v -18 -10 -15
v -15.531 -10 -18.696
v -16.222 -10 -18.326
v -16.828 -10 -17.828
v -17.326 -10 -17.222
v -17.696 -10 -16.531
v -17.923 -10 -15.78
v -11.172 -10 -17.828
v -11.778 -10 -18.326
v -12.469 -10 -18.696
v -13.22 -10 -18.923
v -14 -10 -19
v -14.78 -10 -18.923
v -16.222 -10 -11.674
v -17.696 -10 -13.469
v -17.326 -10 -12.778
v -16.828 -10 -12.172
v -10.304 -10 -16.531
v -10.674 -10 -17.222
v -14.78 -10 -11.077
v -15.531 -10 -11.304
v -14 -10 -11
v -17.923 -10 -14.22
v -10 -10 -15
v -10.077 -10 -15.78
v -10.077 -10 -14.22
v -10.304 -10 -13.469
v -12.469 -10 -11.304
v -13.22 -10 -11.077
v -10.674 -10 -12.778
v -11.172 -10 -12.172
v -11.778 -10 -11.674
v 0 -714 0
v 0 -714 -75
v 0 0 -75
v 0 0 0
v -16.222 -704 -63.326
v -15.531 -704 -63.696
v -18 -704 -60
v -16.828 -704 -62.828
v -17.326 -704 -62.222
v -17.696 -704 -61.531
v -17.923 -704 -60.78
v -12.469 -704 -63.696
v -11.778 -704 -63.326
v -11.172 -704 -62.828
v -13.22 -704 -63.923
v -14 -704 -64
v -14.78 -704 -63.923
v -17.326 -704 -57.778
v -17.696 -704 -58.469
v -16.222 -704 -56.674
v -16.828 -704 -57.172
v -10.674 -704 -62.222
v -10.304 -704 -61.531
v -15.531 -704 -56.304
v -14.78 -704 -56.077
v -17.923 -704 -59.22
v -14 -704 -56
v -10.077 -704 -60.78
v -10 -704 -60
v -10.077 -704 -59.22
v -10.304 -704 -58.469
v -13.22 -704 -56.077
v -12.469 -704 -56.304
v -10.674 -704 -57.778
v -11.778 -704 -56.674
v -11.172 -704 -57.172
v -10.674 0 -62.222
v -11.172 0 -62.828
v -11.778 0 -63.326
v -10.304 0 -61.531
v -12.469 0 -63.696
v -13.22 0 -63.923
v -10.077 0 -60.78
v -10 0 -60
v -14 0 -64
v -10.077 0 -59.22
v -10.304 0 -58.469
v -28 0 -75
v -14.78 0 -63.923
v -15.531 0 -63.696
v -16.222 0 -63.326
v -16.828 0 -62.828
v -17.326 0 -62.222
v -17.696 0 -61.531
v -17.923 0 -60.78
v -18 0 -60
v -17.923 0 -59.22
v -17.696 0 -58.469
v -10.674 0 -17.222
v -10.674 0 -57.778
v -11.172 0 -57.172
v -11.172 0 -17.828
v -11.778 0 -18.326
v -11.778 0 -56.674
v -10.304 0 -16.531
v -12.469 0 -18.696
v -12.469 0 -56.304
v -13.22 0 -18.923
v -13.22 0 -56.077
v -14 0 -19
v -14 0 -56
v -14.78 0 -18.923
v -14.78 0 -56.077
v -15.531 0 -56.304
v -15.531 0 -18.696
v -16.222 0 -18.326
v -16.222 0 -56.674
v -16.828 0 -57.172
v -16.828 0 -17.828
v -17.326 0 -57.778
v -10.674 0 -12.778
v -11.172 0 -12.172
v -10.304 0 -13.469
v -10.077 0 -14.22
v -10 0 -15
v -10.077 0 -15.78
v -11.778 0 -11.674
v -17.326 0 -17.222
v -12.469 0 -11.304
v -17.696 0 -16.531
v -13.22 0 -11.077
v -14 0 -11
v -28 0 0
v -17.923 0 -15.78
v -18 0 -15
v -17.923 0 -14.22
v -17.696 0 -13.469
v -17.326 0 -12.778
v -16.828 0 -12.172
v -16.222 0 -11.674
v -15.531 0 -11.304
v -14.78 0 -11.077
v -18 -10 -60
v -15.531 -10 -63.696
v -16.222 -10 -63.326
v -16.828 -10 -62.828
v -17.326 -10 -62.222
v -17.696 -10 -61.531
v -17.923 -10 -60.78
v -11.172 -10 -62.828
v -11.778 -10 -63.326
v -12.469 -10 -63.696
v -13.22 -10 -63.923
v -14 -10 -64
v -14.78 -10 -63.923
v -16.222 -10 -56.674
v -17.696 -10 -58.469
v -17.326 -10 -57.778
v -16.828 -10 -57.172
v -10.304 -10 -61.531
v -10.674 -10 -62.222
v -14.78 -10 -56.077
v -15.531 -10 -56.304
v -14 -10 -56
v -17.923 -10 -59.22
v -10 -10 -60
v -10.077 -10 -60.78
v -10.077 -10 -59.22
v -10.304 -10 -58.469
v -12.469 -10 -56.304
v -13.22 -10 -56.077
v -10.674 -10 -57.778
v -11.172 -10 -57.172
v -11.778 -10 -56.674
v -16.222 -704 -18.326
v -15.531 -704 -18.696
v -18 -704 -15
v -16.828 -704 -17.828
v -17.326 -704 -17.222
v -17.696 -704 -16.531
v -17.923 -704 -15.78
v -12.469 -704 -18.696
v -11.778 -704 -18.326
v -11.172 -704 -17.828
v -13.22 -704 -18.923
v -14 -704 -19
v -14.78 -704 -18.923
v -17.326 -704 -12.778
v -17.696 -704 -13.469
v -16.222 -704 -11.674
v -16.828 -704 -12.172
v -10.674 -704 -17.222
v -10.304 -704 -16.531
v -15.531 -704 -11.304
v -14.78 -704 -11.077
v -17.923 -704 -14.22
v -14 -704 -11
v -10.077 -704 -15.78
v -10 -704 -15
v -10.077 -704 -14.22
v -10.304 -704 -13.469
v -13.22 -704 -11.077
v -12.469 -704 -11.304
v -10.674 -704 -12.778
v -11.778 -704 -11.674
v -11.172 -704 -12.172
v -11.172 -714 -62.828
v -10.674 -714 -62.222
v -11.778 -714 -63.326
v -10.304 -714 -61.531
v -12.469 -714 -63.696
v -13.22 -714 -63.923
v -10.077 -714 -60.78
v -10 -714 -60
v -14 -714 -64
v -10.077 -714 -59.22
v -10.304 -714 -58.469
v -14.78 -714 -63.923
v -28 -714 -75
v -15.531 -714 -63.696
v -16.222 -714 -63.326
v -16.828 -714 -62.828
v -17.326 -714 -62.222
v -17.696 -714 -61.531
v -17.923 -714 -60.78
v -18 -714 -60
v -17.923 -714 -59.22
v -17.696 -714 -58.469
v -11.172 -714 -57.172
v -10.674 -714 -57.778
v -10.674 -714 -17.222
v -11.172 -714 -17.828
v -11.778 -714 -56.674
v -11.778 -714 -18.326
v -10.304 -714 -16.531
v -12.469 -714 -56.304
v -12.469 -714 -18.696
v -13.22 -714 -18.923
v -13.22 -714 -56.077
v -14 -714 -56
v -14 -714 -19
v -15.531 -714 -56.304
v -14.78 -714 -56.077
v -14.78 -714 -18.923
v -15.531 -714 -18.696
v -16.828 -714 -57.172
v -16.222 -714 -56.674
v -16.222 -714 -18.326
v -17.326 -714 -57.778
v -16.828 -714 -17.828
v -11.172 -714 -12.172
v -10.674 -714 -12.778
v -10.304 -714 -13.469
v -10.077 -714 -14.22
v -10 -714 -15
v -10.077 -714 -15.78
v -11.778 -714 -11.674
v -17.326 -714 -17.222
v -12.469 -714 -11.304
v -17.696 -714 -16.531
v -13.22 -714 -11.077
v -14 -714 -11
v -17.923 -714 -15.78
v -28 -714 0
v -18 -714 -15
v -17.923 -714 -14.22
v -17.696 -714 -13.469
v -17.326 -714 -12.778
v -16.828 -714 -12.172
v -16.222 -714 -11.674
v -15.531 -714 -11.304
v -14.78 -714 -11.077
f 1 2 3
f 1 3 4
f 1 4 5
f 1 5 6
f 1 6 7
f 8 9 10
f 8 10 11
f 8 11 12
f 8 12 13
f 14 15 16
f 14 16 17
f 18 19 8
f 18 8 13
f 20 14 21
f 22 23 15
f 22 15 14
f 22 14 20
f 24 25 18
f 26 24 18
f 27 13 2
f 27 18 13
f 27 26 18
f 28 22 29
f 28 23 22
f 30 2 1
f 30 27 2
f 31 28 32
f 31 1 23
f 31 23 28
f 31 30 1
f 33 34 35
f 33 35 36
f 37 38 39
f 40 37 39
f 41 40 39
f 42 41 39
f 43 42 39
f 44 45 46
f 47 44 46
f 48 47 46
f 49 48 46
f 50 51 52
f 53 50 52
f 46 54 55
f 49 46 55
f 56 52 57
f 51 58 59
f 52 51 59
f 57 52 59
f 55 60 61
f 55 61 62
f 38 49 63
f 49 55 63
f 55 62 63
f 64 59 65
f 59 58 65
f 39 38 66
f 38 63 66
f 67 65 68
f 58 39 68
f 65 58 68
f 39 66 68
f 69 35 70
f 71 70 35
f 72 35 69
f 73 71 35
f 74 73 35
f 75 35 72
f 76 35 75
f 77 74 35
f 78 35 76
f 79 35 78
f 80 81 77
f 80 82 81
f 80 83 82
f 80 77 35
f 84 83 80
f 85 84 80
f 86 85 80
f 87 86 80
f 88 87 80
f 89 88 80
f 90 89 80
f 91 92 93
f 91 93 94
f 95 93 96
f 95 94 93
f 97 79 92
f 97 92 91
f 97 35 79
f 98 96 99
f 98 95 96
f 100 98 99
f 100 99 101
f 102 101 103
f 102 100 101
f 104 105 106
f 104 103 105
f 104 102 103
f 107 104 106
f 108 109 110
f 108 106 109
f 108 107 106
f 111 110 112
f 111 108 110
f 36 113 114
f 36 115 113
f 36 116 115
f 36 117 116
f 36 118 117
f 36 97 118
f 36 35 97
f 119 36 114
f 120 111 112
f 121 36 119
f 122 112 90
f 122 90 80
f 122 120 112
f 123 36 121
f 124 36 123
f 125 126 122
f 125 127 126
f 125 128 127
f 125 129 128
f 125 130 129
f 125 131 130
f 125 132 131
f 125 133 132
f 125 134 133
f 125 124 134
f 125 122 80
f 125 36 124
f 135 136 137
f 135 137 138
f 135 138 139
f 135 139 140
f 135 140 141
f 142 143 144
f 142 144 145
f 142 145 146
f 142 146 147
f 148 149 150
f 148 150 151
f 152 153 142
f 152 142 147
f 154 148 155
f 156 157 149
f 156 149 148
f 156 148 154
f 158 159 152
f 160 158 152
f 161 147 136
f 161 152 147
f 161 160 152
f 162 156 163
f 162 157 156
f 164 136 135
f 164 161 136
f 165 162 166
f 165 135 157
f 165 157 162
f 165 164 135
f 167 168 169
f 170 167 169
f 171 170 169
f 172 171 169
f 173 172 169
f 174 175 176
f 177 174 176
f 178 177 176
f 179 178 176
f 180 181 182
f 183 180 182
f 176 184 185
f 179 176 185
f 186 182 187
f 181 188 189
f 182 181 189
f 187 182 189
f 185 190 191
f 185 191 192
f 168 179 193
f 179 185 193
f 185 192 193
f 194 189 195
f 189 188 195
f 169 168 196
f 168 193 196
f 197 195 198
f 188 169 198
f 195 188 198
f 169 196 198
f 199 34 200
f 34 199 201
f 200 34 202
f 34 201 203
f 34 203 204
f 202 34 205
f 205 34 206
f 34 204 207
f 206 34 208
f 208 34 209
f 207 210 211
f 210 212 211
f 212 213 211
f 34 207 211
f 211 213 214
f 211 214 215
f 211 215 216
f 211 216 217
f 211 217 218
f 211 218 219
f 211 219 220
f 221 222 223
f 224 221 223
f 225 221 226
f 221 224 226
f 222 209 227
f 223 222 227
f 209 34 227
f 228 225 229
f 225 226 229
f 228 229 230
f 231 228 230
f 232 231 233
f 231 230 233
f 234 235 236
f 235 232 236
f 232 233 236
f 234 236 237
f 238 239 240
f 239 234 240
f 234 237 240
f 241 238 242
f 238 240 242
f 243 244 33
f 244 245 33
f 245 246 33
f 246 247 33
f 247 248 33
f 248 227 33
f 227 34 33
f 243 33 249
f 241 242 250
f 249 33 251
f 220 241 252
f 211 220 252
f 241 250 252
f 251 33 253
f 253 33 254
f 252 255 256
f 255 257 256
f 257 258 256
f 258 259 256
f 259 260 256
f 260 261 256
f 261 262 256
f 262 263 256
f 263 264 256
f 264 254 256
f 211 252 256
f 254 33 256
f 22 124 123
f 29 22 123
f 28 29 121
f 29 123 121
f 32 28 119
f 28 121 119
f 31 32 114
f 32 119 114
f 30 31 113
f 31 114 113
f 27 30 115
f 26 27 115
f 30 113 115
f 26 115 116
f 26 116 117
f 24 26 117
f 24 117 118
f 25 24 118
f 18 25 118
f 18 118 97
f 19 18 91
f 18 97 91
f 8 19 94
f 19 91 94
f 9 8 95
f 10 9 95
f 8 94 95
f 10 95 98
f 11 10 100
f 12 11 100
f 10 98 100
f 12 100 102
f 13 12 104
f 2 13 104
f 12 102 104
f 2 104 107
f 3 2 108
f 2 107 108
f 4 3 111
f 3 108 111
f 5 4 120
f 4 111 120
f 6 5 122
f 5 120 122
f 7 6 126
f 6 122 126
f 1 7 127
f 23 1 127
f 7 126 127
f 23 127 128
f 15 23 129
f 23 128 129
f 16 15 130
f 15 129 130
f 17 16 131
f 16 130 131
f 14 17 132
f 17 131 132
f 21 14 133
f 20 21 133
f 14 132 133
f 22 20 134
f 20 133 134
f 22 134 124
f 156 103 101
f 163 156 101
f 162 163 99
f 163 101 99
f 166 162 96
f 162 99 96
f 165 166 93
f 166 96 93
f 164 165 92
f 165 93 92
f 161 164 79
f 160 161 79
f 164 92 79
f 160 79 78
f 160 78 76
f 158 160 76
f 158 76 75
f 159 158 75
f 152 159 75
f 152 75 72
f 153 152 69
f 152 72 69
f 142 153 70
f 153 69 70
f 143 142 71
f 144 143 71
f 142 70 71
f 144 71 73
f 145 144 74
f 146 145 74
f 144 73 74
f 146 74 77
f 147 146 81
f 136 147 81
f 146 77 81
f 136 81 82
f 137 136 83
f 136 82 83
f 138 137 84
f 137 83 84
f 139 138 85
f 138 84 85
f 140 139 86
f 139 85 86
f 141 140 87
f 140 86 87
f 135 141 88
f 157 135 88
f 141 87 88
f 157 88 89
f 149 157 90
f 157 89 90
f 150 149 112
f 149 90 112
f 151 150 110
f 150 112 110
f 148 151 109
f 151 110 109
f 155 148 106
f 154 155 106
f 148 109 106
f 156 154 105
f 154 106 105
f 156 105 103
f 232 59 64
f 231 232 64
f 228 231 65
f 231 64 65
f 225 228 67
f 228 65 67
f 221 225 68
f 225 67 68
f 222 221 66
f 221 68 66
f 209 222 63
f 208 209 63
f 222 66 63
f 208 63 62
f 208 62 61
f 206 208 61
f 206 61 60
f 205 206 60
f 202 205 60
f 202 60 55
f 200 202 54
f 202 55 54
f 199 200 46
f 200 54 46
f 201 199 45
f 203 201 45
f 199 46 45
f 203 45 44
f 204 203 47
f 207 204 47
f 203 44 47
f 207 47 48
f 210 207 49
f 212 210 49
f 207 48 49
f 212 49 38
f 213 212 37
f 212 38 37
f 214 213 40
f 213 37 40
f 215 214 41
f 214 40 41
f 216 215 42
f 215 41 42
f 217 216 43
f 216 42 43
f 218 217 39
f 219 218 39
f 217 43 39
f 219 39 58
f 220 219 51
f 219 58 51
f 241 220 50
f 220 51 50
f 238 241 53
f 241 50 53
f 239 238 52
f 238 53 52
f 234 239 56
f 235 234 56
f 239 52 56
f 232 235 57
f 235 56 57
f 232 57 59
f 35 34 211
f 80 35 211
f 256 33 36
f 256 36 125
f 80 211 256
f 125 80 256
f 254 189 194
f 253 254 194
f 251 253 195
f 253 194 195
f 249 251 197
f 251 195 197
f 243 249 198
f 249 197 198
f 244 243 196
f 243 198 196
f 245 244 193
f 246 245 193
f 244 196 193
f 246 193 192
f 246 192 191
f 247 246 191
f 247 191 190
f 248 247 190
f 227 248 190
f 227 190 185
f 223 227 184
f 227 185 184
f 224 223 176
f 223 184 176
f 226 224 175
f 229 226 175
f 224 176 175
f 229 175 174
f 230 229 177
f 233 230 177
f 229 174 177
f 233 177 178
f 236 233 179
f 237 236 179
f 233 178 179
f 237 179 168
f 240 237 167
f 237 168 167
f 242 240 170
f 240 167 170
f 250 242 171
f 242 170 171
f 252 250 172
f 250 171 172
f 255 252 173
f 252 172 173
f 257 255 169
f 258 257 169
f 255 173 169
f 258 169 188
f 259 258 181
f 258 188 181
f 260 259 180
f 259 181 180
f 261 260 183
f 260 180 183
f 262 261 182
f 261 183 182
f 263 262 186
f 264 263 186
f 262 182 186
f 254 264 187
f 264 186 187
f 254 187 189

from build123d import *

# Parameters (mm, degrees)
SKETCH1_W           = 28
SKETCH1_H           = 75
LEFT_HAND_END_DEPTH = 714
SKETCH2_R           = 4
EXTRUDE1_DEPTH      = 10
EXTRUDE2_START      = 10
SKETCH3_R           = 4
EXTRUDE2_DEPTH      = 10


with BuildPart() as part:
    # Sketch1 → Left Hand End (new body)
    with BuildSketch(Plane(origin=(0, -714, 0), x_dir=(-1, 0, 0), z_dir=(0, 1, 0))):
        with Locations((14, -37.5)):
            Rectangle(SKETCH1_W, SKETCH1_H)
    extrude(amount=LEFT_HAND_END_DEPTH)

    # Sketch2 → Extrude1 (cut)
    with BuildSketch(Plane(origin=(0, 0, 0), x_dir=(1, 0, 0), z_dir=(0, 1, 0))):
        with Locations(Location((-14, 15, 0), (0, 0, 270))):
            Circle(SKETCH2_R)
        with Locations(Location((-14, 60, 0), (0, 0, 270))):
            Circle(SKETCH2_R)
    extrude(amount=-EXTRUDE1_DEPTH, mode=Mode.SUBTRACT)

    # Sketch3 → Extrude2 (cut)
    with BuildSketch(Plane(origin=(0, -714, 0), x_dir=(-1, 0, 0), z_dir=(0, 1, 0)).offset(EXTRUDE2_START)):
        with Locations(Location((14, -60, 0), (0, 0, 90))):
            Circle(SKETCH3_R)
        with Locations(Location((14, -15, 0), (0, 0, 90))):
            Circle(SKETCH3_R)
    extrude(amount=-EXTRUDE2_DEPTH, mode=Mode.SUBTRACT)


solid = part.part
